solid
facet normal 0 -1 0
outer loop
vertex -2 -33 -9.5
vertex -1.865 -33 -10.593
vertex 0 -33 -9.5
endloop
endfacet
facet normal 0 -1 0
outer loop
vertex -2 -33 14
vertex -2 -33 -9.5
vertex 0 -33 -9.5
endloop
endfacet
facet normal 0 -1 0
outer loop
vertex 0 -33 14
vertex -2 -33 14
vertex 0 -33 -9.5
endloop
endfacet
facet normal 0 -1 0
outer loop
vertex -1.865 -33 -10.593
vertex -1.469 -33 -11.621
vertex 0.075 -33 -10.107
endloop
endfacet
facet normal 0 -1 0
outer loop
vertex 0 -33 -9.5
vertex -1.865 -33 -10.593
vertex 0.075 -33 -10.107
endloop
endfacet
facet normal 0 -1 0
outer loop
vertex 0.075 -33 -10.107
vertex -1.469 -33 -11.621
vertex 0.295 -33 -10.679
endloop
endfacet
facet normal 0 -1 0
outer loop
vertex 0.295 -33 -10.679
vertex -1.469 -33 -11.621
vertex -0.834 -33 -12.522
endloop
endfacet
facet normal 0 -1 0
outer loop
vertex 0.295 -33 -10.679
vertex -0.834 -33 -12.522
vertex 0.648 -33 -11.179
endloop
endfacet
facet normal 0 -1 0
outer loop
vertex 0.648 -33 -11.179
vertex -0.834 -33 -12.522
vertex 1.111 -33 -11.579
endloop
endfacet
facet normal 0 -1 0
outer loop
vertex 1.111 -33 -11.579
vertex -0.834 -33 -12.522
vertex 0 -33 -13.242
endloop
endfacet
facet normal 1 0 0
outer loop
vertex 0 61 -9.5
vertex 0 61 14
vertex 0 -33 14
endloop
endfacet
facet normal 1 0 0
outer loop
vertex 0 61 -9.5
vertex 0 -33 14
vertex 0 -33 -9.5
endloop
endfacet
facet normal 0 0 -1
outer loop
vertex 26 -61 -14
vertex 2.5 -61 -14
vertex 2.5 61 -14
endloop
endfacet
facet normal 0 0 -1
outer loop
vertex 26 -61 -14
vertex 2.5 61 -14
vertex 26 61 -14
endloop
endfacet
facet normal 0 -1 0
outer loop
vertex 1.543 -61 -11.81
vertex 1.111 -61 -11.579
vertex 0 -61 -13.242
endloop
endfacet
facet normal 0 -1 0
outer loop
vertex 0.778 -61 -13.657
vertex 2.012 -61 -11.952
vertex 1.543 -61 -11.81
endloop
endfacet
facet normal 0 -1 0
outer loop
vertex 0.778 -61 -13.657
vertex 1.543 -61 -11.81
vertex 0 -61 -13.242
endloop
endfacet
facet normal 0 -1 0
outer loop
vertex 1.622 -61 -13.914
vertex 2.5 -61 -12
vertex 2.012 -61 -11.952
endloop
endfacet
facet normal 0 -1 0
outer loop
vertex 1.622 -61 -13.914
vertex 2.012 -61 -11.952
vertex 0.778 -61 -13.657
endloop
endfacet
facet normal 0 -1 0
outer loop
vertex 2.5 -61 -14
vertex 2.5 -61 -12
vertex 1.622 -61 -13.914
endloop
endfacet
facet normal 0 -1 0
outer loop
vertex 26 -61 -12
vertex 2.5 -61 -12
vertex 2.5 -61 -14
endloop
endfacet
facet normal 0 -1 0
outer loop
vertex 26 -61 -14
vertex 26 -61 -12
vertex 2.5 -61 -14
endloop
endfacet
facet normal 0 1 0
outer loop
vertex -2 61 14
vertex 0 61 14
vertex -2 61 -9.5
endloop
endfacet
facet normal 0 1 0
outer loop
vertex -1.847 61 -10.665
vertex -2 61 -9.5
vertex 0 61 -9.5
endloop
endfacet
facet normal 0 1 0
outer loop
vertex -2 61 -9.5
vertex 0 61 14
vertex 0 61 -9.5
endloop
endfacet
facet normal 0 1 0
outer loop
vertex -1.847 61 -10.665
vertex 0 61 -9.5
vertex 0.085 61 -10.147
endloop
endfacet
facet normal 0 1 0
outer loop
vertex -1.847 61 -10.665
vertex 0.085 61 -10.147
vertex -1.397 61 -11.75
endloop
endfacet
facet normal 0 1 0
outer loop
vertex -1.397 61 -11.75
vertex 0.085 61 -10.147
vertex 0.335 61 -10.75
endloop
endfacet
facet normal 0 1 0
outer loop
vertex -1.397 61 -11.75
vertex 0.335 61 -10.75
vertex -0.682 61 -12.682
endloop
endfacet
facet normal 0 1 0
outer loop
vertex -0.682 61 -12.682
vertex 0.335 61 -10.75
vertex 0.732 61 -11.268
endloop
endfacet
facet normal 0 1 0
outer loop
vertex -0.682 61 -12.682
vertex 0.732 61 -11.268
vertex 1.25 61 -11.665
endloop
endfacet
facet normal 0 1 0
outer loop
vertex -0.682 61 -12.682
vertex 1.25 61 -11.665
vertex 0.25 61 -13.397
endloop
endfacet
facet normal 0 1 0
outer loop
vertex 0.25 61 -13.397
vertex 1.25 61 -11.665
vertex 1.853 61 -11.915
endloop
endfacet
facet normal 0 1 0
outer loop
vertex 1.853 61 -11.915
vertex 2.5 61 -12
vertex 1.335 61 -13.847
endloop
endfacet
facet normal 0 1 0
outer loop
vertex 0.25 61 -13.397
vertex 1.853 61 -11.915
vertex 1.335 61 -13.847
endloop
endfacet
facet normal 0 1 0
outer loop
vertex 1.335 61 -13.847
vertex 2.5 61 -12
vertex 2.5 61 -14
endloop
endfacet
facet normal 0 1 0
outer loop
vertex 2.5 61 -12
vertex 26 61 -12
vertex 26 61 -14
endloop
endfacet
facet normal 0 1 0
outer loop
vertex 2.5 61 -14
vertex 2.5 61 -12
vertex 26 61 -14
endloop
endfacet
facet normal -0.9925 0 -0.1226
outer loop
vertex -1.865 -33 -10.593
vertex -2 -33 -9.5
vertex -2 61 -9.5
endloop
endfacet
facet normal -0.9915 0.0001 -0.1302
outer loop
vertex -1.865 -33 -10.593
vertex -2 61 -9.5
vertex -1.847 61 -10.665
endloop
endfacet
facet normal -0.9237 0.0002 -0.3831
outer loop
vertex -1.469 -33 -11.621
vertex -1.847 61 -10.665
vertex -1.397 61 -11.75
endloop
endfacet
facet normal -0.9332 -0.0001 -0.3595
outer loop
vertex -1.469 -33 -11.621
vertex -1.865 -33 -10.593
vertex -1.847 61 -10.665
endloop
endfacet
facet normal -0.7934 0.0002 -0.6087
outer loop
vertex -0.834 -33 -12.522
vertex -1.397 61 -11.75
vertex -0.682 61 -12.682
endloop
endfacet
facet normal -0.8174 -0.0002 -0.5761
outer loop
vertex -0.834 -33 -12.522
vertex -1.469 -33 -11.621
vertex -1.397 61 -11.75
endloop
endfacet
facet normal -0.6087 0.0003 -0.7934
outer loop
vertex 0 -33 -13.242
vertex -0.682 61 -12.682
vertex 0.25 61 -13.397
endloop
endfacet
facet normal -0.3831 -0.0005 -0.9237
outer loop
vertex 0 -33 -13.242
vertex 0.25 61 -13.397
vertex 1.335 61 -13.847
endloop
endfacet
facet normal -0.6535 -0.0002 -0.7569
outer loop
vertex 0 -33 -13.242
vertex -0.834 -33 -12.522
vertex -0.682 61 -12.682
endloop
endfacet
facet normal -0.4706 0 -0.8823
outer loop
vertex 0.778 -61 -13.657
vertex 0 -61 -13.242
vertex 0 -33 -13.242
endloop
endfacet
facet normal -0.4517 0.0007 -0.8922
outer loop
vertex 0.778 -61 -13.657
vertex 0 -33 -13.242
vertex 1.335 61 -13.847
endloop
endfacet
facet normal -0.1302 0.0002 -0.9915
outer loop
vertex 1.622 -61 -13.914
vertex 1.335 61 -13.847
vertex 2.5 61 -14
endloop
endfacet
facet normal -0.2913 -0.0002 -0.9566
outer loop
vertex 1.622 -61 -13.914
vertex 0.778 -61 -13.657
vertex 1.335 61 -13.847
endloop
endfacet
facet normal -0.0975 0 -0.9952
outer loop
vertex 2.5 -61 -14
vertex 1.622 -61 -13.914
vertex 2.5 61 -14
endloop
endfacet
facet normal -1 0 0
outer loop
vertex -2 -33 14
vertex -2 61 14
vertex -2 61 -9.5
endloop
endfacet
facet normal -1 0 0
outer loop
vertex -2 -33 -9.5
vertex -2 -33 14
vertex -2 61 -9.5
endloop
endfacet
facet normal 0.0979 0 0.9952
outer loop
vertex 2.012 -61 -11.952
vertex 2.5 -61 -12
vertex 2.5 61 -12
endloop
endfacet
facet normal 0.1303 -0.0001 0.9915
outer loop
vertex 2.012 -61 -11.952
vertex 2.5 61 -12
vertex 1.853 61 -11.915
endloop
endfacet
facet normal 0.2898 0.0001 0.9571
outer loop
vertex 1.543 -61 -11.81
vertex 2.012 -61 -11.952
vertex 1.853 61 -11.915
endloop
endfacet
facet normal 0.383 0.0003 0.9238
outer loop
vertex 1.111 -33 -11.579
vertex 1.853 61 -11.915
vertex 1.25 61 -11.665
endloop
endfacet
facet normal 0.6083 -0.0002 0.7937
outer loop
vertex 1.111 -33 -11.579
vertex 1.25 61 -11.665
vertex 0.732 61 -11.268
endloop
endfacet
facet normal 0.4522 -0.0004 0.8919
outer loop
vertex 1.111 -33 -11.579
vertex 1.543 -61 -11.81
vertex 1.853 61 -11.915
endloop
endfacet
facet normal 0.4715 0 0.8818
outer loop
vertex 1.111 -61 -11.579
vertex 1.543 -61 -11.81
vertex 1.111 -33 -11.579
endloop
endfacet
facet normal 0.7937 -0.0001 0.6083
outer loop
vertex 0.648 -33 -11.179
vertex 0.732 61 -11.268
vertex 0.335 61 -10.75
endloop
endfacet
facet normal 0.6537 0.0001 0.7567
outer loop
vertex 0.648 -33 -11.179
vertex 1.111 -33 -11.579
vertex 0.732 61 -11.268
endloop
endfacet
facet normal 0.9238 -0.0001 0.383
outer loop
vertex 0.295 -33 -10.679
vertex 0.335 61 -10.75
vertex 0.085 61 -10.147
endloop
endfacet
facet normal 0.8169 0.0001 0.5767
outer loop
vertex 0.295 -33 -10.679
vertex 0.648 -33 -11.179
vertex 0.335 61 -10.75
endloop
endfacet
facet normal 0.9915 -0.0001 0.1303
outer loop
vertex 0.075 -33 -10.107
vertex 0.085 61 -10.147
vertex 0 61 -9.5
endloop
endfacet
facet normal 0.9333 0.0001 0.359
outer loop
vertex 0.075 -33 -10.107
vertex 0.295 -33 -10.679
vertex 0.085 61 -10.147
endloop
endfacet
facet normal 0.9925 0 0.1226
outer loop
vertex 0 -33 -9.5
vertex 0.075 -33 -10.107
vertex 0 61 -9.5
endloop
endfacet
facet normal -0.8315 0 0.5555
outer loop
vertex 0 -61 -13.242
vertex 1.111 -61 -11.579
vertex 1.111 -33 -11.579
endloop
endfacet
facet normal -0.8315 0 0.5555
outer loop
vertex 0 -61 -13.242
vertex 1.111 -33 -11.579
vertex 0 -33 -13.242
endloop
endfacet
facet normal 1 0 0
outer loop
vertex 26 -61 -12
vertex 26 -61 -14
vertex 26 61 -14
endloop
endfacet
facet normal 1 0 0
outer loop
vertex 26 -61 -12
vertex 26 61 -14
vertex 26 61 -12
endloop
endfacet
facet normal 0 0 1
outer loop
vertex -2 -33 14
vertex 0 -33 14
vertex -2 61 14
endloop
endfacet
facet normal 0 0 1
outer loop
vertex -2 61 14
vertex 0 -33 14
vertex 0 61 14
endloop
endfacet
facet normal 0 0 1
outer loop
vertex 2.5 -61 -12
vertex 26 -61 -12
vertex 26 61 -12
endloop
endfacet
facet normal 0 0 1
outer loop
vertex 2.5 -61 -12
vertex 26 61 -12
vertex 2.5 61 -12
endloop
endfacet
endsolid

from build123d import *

# Parameters (mm, degrees)
SKETCH1_W                    = 28
SKETCH1_H                    = 122
BASE_FLANGE1_DEPTH           = 2
EDGE_FLANGE1_STRIP_W         = 13
EDGE_FLANGE1_STRIP_H         = 2
EDGE_FLANGE1_STRIP_CUT_DEPTH = 122
EDGE_FLANGE1_DEPTH           = 122
CUT_EXTRUDE1_START           = -61
CUT_EXTRUDE1_DEPTH           = 28


# Read off the part's stored shape, not the designer's step: Cut-Extrude1
# Sheet-metal steps are written as plain solids
with BuildPart() as part:
    # Sketch1 → Base-Flange1 (new body)
    with BuildSketch(Plane(origin=(0, 0, 0), x_dir=(0, 0, -1), z_dir=(1, 0, 0))):
        Rectangle(SKETCH1_W, SKETCH1_H)
    extrude(amount=-BASE_FLANGE1_DEPTH)

    # Edge-Flange1 strip (across the edge) → Edge-Flange1 strip cut (cut)
    with BuildSketch(Plane(origin=(0, -61, -14), x_dir=(0, 0, 1), z_dir=(0, 1, 0))):
        with Locations((-2, -1)):
            Rectangle(EDGE_FLANGE1_STRIP_W, EDGE_FLANGE1_STRIP_H)
    extrude(amount=EDGE_FLANGE1_STRIP_CUT_DEPTH, mode=Mode.SUBTRACT)

    # Edge-Flange1 section (across the edge) → Edge-Flange1 (add)
    with BuildSketch(Plane(origin=(0, -61, -14), x_dir=(0, 0, 1), z_dir=(0, 1, 0))):
        with BuildLine():
            Line((0, 2.5), (0, 26))
            Line((0, 26), (2, 26))
            Line((2, 26), (2, 2.5))
            ThreePointArc((2, 2.5), (2.732233047, 0.732233047), (4.5, 0))
            Line((4.5, 0), (4.5, -2))
            ThreePointArc((4.5, -2), (1.318019485, -0.681980515), (0, 2.5))
        make_face()
    extrude(amount=EDGE_FLANGE1_DEPTH)

    # Cut-Extrude1 outline → Cut-Extrude1 (cut)
    with BuildSketch(Plane(origin=(0, 0, 0), x_dir=(1, 0, 0), z_dir=(0, 1, 0)).offset(CUT_EXTRUDE1_START)):
        with BuildLine():
            Line((1.111111111, 11.578698548), (0, 13.241657386))
            ThreePointArc((0, 13.241657386), (-1.468626966, 11.621320343), (-2, 9.5))
            Line((-2, 9.5), (-2, -14))
            Line((-2, -14), (0, -14))
            Line((0, -14), (0, 9.5))
            ThreePointArc((0, 9.5), (0.295207241, 10.678511302), (1.111111111, 11.578698548))
        make_face()
    extrude(amount=CUT_EXTRUDE1_DEPTH, mode=Mode.SUBTRACT)


solid = part.part
